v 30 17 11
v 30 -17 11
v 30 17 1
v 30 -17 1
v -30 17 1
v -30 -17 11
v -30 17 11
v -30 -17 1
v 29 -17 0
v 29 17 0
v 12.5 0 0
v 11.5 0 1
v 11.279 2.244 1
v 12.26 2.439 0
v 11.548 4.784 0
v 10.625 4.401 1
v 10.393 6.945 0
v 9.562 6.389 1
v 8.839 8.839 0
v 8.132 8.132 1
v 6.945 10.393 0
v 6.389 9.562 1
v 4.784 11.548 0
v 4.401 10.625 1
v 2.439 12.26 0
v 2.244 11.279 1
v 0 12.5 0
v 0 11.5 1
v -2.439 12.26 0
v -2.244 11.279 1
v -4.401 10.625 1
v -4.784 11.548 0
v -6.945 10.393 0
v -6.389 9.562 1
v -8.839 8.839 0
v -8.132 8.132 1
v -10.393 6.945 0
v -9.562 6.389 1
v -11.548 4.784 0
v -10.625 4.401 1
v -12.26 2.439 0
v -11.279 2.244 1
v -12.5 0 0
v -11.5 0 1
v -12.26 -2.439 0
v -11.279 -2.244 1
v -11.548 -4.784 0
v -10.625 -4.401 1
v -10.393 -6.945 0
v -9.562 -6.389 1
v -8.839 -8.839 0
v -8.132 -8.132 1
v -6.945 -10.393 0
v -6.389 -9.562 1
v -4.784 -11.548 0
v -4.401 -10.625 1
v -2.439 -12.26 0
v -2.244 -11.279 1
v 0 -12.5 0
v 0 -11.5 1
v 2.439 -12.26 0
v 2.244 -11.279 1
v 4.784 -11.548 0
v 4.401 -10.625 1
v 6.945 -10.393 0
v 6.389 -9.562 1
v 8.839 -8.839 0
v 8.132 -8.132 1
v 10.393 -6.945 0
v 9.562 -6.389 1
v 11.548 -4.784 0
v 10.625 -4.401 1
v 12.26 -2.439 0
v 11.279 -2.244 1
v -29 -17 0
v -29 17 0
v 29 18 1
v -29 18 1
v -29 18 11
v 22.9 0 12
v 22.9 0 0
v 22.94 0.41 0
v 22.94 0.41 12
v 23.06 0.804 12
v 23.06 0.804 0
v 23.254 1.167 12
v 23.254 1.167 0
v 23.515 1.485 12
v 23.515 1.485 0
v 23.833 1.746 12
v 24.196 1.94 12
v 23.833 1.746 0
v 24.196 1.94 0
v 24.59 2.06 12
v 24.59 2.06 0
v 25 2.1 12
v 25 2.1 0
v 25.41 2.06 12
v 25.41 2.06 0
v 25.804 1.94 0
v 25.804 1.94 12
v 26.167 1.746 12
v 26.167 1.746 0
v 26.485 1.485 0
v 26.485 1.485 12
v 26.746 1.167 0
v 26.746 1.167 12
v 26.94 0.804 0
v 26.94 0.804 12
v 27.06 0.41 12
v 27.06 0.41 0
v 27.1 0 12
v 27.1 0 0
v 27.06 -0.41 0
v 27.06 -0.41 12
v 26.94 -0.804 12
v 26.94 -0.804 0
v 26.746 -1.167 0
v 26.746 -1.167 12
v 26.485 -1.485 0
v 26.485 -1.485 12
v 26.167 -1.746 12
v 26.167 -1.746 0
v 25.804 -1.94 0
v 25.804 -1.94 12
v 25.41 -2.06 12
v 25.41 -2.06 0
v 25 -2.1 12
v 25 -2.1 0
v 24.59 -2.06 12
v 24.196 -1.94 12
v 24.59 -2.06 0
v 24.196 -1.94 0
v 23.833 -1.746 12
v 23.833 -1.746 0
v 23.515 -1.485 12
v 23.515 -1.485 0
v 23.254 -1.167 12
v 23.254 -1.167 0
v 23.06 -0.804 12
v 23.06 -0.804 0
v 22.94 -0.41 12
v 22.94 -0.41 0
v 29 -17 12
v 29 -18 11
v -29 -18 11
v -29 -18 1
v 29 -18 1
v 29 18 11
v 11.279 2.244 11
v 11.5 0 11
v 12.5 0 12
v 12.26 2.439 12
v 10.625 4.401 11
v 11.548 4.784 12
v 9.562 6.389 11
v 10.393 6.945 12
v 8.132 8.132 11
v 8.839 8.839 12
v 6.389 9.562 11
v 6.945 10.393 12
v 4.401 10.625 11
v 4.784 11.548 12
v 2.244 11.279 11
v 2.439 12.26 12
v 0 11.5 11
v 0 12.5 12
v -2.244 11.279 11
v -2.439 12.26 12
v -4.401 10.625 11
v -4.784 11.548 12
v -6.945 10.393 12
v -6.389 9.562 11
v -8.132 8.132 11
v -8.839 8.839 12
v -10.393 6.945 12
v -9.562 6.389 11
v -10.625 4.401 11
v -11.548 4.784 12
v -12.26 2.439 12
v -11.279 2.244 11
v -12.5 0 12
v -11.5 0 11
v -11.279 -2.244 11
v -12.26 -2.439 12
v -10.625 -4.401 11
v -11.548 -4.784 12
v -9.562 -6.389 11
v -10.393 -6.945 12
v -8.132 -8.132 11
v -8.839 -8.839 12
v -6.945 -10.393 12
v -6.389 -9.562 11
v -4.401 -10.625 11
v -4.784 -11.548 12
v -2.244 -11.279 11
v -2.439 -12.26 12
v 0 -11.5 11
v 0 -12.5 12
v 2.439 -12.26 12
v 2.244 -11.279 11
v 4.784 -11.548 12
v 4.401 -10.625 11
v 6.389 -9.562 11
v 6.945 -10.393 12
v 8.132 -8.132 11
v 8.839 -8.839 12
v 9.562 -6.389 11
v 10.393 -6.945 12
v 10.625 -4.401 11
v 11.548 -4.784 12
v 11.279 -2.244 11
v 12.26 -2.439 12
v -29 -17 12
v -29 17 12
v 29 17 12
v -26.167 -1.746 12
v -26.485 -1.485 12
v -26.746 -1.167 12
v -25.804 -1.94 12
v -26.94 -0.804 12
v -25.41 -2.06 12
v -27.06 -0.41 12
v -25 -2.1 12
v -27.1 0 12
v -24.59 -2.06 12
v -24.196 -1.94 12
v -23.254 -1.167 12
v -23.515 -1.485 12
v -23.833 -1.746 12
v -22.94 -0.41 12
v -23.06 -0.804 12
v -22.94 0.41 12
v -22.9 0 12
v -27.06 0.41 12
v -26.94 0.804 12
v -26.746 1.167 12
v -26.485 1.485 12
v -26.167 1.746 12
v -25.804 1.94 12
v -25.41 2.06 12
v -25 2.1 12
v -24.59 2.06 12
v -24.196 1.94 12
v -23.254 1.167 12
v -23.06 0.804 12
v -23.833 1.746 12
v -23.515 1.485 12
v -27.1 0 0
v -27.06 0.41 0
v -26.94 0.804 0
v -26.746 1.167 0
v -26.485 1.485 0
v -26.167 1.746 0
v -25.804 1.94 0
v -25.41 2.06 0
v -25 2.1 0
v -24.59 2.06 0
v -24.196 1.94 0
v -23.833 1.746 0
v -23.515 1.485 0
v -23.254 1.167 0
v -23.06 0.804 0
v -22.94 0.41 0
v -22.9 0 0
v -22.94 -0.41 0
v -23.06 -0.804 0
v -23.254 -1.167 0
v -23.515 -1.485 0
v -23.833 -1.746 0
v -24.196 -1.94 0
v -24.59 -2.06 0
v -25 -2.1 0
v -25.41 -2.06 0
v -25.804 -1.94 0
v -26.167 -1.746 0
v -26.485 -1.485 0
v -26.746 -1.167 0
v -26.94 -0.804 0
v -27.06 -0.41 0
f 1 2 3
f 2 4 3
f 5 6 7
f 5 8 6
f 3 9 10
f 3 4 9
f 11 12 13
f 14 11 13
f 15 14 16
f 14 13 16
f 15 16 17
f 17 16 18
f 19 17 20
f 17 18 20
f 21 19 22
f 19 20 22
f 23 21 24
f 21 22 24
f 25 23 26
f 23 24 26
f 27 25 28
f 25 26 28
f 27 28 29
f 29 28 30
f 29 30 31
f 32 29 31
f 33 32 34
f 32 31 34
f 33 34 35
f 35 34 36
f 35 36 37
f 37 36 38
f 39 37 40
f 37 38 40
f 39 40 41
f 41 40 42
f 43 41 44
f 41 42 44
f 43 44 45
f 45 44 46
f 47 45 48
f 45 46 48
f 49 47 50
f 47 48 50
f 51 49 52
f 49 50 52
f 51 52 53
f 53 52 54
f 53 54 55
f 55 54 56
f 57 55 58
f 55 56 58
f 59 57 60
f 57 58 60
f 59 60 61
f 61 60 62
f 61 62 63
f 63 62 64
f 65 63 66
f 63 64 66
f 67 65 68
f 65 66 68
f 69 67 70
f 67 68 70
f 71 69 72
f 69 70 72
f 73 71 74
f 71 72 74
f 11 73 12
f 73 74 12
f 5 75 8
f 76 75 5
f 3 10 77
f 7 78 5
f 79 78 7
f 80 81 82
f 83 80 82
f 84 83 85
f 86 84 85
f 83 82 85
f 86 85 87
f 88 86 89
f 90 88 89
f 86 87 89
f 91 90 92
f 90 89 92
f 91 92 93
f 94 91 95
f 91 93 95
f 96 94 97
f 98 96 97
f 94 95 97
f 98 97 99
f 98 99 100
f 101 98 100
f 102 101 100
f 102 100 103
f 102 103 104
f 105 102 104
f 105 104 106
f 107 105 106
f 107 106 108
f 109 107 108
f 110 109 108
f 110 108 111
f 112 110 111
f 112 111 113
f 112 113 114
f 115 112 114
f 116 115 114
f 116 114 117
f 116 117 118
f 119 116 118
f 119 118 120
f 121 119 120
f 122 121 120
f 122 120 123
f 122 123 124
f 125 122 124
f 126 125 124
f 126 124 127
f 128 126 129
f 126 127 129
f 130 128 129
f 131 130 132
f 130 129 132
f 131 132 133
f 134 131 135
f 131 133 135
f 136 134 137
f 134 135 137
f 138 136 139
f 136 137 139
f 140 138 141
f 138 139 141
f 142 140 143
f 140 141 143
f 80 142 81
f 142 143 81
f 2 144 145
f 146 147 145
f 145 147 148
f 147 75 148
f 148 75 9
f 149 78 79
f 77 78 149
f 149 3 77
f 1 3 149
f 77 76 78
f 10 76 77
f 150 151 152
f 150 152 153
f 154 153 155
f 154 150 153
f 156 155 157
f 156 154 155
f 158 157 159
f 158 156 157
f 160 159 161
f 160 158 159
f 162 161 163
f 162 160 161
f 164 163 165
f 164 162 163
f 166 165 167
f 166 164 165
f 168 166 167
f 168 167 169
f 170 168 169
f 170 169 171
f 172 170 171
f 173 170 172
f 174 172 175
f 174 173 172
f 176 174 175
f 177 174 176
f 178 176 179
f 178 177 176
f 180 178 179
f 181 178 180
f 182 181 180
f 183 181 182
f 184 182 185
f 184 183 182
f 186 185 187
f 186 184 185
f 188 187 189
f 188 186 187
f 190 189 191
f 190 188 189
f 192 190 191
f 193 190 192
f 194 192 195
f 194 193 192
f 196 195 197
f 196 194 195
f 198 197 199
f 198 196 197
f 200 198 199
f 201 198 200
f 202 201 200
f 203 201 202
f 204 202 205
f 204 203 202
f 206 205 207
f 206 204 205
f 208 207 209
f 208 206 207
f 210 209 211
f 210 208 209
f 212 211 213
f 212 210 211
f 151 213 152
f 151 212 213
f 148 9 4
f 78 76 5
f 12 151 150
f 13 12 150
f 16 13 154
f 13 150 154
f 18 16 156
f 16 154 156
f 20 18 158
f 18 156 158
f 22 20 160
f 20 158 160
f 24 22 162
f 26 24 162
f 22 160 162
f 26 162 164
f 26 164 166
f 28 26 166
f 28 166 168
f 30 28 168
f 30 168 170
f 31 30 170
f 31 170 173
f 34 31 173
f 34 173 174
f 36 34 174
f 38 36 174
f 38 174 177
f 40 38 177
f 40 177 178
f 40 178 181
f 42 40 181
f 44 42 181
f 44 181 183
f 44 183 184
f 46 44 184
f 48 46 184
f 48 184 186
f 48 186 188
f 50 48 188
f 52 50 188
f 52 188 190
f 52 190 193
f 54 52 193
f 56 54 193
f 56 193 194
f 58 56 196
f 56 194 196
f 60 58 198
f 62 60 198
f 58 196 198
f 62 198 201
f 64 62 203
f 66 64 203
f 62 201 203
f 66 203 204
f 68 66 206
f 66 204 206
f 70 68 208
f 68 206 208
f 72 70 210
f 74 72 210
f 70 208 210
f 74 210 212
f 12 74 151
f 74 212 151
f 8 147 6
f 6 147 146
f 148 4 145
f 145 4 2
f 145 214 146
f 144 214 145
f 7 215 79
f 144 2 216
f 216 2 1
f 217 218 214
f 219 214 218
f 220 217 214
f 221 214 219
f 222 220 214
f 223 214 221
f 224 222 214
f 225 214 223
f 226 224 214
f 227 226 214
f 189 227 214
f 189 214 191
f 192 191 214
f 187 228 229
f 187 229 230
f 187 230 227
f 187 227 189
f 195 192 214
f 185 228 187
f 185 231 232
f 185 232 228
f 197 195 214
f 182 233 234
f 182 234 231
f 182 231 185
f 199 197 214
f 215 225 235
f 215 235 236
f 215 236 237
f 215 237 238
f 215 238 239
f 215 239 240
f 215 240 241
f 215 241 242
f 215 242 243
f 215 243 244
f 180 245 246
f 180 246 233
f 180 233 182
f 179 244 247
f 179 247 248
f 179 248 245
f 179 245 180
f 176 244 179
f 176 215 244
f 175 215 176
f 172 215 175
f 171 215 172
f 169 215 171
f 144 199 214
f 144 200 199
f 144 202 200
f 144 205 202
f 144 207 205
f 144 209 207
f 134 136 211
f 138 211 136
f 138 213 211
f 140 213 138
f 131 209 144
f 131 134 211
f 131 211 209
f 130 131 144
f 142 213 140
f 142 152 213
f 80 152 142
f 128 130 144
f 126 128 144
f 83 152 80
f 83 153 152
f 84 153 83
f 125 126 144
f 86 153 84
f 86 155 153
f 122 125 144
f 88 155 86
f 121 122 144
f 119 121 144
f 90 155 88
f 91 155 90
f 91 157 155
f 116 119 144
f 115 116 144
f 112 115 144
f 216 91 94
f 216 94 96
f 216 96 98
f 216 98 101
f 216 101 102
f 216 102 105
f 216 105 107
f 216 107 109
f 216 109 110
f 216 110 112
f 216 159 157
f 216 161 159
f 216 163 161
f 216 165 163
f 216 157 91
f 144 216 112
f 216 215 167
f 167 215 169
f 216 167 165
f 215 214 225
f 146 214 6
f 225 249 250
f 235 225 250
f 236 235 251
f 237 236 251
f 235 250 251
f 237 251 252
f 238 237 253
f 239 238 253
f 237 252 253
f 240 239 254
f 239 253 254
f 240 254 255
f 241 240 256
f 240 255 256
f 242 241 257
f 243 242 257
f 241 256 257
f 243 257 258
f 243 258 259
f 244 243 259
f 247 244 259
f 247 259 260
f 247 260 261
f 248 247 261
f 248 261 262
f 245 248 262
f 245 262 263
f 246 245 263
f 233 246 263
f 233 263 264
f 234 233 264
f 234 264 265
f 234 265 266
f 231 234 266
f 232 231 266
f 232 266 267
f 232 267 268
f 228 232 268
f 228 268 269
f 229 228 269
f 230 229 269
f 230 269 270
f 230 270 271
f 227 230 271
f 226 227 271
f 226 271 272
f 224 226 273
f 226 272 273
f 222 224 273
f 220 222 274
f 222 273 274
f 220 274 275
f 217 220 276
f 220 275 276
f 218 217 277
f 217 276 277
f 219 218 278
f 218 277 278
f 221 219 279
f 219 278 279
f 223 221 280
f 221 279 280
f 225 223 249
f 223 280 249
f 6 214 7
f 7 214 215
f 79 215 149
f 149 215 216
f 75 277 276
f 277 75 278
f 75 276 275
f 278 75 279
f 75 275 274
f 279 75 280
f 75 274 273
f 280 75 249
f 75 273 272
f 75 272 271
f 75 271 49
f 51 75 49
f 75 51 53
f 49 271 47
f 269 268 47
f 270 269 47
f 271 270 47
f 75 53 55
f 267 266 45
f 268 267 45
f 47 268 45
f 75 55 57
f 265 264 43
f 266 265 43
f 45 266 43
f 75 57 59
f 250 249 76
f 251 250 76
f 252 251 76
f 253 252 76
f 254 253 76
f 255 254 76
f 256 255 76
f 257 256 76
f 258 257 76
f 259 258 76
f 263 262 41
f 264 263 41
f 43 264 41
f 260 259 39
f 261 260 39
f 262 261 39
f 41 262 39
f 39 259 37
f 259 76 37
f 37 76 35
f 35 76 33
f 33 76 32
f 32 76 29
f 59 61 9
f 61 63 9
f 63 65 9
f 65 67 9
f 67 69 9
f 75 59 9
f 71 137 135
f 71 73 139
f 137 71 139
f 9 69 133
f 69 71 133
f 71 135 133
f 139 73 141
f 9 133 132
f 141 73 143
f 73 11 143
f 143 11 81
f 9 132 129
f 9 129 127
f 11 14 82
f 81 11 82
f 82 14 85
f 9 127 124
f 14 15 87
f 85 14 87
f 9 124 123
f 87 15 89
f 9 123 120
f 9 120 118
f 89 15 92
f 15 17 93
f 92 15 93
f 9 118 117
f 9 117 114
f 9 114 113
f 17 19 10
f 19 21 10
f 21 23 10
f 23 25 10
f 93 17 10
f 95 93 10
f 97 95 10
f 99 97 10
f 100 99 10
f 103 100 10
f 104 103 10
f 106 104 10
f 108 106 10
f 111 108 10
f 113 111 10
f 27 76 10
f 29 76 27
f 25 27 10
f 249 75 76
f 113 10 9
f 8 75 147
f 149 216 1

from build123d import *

# Parameters (mm, degrees)
ESQUISSE1_W             = 60
ESQUISSE1_H             = 36
BOSS_EXTRU_1_DEPTH      = 12
ENL_V_MAT_EXTRU_1_REACH = 38.986
ESQUISSE2_R             = 11.5
TROU_TARAUD_M51_D       = 4.2
CHANFREIN1_SIZE         = 1


with BuildPart() as part:
    # Esquisse1 → Boss.-Extru.1 (new body)
    with BuildSketch(Plane.XY):
        Rectangle(ESQUISSE1_W, ESQUISSE1_H)
    extrude(amount=BOSS_EXTRU_1_DEPTH)

    # Esquisse2 → Enlèv. mat.-Extru.1 (cut, up to next)
    with BuildSketch(Plane.XY.offset(12), mode=Mode.PRIVATE) as enl_v_mat_extru_1_sk1:
        Circle(ESQUISSE2_R)
    enl_v_mat_extru_1_tool1 = extrude(enl_v_mat_extru_1_sk1.sketch, amount=-ENL_V_MAT_EXTRU_1_REACH, mode=Mode.PRIVATE) & part.part
    add(enl_v_mat_extru_1_tool1.solids().sort_by_distance((0, 0, 12))[0], mode=Mode.SUBTRACT)

    # Trou taraudé M51 (through all)
    with Locations(Plane.XY.offset(12)):
        with Locations((-25, 0), (25, 0)):
            Hole(TROU_TARAUD_M51_D / 2)

    # Chanfrein1
    chanfrein1_edges = [part.edges().sort_by_distance(p)[0] for p in [
        (30, 0, 12),
        (0, 18, 12),
        (-11.5, 0, 12),
        (-11.5, 0, 0),
        (-30, 0, 12),
        (0, 18, 0),
        (30, 0, 0),
        (0, -18, 0),
        (-30, 0, 0),
        (0, -18, 12),
        (-30, 18, 6),
        (30, 18, 6),
        (30, -18, 6),
        (-30, -18, 6),
    ]]
    chamfer(chanfrein1_edges, length=CHANFREIN1_SIZE)


solid = part.part
